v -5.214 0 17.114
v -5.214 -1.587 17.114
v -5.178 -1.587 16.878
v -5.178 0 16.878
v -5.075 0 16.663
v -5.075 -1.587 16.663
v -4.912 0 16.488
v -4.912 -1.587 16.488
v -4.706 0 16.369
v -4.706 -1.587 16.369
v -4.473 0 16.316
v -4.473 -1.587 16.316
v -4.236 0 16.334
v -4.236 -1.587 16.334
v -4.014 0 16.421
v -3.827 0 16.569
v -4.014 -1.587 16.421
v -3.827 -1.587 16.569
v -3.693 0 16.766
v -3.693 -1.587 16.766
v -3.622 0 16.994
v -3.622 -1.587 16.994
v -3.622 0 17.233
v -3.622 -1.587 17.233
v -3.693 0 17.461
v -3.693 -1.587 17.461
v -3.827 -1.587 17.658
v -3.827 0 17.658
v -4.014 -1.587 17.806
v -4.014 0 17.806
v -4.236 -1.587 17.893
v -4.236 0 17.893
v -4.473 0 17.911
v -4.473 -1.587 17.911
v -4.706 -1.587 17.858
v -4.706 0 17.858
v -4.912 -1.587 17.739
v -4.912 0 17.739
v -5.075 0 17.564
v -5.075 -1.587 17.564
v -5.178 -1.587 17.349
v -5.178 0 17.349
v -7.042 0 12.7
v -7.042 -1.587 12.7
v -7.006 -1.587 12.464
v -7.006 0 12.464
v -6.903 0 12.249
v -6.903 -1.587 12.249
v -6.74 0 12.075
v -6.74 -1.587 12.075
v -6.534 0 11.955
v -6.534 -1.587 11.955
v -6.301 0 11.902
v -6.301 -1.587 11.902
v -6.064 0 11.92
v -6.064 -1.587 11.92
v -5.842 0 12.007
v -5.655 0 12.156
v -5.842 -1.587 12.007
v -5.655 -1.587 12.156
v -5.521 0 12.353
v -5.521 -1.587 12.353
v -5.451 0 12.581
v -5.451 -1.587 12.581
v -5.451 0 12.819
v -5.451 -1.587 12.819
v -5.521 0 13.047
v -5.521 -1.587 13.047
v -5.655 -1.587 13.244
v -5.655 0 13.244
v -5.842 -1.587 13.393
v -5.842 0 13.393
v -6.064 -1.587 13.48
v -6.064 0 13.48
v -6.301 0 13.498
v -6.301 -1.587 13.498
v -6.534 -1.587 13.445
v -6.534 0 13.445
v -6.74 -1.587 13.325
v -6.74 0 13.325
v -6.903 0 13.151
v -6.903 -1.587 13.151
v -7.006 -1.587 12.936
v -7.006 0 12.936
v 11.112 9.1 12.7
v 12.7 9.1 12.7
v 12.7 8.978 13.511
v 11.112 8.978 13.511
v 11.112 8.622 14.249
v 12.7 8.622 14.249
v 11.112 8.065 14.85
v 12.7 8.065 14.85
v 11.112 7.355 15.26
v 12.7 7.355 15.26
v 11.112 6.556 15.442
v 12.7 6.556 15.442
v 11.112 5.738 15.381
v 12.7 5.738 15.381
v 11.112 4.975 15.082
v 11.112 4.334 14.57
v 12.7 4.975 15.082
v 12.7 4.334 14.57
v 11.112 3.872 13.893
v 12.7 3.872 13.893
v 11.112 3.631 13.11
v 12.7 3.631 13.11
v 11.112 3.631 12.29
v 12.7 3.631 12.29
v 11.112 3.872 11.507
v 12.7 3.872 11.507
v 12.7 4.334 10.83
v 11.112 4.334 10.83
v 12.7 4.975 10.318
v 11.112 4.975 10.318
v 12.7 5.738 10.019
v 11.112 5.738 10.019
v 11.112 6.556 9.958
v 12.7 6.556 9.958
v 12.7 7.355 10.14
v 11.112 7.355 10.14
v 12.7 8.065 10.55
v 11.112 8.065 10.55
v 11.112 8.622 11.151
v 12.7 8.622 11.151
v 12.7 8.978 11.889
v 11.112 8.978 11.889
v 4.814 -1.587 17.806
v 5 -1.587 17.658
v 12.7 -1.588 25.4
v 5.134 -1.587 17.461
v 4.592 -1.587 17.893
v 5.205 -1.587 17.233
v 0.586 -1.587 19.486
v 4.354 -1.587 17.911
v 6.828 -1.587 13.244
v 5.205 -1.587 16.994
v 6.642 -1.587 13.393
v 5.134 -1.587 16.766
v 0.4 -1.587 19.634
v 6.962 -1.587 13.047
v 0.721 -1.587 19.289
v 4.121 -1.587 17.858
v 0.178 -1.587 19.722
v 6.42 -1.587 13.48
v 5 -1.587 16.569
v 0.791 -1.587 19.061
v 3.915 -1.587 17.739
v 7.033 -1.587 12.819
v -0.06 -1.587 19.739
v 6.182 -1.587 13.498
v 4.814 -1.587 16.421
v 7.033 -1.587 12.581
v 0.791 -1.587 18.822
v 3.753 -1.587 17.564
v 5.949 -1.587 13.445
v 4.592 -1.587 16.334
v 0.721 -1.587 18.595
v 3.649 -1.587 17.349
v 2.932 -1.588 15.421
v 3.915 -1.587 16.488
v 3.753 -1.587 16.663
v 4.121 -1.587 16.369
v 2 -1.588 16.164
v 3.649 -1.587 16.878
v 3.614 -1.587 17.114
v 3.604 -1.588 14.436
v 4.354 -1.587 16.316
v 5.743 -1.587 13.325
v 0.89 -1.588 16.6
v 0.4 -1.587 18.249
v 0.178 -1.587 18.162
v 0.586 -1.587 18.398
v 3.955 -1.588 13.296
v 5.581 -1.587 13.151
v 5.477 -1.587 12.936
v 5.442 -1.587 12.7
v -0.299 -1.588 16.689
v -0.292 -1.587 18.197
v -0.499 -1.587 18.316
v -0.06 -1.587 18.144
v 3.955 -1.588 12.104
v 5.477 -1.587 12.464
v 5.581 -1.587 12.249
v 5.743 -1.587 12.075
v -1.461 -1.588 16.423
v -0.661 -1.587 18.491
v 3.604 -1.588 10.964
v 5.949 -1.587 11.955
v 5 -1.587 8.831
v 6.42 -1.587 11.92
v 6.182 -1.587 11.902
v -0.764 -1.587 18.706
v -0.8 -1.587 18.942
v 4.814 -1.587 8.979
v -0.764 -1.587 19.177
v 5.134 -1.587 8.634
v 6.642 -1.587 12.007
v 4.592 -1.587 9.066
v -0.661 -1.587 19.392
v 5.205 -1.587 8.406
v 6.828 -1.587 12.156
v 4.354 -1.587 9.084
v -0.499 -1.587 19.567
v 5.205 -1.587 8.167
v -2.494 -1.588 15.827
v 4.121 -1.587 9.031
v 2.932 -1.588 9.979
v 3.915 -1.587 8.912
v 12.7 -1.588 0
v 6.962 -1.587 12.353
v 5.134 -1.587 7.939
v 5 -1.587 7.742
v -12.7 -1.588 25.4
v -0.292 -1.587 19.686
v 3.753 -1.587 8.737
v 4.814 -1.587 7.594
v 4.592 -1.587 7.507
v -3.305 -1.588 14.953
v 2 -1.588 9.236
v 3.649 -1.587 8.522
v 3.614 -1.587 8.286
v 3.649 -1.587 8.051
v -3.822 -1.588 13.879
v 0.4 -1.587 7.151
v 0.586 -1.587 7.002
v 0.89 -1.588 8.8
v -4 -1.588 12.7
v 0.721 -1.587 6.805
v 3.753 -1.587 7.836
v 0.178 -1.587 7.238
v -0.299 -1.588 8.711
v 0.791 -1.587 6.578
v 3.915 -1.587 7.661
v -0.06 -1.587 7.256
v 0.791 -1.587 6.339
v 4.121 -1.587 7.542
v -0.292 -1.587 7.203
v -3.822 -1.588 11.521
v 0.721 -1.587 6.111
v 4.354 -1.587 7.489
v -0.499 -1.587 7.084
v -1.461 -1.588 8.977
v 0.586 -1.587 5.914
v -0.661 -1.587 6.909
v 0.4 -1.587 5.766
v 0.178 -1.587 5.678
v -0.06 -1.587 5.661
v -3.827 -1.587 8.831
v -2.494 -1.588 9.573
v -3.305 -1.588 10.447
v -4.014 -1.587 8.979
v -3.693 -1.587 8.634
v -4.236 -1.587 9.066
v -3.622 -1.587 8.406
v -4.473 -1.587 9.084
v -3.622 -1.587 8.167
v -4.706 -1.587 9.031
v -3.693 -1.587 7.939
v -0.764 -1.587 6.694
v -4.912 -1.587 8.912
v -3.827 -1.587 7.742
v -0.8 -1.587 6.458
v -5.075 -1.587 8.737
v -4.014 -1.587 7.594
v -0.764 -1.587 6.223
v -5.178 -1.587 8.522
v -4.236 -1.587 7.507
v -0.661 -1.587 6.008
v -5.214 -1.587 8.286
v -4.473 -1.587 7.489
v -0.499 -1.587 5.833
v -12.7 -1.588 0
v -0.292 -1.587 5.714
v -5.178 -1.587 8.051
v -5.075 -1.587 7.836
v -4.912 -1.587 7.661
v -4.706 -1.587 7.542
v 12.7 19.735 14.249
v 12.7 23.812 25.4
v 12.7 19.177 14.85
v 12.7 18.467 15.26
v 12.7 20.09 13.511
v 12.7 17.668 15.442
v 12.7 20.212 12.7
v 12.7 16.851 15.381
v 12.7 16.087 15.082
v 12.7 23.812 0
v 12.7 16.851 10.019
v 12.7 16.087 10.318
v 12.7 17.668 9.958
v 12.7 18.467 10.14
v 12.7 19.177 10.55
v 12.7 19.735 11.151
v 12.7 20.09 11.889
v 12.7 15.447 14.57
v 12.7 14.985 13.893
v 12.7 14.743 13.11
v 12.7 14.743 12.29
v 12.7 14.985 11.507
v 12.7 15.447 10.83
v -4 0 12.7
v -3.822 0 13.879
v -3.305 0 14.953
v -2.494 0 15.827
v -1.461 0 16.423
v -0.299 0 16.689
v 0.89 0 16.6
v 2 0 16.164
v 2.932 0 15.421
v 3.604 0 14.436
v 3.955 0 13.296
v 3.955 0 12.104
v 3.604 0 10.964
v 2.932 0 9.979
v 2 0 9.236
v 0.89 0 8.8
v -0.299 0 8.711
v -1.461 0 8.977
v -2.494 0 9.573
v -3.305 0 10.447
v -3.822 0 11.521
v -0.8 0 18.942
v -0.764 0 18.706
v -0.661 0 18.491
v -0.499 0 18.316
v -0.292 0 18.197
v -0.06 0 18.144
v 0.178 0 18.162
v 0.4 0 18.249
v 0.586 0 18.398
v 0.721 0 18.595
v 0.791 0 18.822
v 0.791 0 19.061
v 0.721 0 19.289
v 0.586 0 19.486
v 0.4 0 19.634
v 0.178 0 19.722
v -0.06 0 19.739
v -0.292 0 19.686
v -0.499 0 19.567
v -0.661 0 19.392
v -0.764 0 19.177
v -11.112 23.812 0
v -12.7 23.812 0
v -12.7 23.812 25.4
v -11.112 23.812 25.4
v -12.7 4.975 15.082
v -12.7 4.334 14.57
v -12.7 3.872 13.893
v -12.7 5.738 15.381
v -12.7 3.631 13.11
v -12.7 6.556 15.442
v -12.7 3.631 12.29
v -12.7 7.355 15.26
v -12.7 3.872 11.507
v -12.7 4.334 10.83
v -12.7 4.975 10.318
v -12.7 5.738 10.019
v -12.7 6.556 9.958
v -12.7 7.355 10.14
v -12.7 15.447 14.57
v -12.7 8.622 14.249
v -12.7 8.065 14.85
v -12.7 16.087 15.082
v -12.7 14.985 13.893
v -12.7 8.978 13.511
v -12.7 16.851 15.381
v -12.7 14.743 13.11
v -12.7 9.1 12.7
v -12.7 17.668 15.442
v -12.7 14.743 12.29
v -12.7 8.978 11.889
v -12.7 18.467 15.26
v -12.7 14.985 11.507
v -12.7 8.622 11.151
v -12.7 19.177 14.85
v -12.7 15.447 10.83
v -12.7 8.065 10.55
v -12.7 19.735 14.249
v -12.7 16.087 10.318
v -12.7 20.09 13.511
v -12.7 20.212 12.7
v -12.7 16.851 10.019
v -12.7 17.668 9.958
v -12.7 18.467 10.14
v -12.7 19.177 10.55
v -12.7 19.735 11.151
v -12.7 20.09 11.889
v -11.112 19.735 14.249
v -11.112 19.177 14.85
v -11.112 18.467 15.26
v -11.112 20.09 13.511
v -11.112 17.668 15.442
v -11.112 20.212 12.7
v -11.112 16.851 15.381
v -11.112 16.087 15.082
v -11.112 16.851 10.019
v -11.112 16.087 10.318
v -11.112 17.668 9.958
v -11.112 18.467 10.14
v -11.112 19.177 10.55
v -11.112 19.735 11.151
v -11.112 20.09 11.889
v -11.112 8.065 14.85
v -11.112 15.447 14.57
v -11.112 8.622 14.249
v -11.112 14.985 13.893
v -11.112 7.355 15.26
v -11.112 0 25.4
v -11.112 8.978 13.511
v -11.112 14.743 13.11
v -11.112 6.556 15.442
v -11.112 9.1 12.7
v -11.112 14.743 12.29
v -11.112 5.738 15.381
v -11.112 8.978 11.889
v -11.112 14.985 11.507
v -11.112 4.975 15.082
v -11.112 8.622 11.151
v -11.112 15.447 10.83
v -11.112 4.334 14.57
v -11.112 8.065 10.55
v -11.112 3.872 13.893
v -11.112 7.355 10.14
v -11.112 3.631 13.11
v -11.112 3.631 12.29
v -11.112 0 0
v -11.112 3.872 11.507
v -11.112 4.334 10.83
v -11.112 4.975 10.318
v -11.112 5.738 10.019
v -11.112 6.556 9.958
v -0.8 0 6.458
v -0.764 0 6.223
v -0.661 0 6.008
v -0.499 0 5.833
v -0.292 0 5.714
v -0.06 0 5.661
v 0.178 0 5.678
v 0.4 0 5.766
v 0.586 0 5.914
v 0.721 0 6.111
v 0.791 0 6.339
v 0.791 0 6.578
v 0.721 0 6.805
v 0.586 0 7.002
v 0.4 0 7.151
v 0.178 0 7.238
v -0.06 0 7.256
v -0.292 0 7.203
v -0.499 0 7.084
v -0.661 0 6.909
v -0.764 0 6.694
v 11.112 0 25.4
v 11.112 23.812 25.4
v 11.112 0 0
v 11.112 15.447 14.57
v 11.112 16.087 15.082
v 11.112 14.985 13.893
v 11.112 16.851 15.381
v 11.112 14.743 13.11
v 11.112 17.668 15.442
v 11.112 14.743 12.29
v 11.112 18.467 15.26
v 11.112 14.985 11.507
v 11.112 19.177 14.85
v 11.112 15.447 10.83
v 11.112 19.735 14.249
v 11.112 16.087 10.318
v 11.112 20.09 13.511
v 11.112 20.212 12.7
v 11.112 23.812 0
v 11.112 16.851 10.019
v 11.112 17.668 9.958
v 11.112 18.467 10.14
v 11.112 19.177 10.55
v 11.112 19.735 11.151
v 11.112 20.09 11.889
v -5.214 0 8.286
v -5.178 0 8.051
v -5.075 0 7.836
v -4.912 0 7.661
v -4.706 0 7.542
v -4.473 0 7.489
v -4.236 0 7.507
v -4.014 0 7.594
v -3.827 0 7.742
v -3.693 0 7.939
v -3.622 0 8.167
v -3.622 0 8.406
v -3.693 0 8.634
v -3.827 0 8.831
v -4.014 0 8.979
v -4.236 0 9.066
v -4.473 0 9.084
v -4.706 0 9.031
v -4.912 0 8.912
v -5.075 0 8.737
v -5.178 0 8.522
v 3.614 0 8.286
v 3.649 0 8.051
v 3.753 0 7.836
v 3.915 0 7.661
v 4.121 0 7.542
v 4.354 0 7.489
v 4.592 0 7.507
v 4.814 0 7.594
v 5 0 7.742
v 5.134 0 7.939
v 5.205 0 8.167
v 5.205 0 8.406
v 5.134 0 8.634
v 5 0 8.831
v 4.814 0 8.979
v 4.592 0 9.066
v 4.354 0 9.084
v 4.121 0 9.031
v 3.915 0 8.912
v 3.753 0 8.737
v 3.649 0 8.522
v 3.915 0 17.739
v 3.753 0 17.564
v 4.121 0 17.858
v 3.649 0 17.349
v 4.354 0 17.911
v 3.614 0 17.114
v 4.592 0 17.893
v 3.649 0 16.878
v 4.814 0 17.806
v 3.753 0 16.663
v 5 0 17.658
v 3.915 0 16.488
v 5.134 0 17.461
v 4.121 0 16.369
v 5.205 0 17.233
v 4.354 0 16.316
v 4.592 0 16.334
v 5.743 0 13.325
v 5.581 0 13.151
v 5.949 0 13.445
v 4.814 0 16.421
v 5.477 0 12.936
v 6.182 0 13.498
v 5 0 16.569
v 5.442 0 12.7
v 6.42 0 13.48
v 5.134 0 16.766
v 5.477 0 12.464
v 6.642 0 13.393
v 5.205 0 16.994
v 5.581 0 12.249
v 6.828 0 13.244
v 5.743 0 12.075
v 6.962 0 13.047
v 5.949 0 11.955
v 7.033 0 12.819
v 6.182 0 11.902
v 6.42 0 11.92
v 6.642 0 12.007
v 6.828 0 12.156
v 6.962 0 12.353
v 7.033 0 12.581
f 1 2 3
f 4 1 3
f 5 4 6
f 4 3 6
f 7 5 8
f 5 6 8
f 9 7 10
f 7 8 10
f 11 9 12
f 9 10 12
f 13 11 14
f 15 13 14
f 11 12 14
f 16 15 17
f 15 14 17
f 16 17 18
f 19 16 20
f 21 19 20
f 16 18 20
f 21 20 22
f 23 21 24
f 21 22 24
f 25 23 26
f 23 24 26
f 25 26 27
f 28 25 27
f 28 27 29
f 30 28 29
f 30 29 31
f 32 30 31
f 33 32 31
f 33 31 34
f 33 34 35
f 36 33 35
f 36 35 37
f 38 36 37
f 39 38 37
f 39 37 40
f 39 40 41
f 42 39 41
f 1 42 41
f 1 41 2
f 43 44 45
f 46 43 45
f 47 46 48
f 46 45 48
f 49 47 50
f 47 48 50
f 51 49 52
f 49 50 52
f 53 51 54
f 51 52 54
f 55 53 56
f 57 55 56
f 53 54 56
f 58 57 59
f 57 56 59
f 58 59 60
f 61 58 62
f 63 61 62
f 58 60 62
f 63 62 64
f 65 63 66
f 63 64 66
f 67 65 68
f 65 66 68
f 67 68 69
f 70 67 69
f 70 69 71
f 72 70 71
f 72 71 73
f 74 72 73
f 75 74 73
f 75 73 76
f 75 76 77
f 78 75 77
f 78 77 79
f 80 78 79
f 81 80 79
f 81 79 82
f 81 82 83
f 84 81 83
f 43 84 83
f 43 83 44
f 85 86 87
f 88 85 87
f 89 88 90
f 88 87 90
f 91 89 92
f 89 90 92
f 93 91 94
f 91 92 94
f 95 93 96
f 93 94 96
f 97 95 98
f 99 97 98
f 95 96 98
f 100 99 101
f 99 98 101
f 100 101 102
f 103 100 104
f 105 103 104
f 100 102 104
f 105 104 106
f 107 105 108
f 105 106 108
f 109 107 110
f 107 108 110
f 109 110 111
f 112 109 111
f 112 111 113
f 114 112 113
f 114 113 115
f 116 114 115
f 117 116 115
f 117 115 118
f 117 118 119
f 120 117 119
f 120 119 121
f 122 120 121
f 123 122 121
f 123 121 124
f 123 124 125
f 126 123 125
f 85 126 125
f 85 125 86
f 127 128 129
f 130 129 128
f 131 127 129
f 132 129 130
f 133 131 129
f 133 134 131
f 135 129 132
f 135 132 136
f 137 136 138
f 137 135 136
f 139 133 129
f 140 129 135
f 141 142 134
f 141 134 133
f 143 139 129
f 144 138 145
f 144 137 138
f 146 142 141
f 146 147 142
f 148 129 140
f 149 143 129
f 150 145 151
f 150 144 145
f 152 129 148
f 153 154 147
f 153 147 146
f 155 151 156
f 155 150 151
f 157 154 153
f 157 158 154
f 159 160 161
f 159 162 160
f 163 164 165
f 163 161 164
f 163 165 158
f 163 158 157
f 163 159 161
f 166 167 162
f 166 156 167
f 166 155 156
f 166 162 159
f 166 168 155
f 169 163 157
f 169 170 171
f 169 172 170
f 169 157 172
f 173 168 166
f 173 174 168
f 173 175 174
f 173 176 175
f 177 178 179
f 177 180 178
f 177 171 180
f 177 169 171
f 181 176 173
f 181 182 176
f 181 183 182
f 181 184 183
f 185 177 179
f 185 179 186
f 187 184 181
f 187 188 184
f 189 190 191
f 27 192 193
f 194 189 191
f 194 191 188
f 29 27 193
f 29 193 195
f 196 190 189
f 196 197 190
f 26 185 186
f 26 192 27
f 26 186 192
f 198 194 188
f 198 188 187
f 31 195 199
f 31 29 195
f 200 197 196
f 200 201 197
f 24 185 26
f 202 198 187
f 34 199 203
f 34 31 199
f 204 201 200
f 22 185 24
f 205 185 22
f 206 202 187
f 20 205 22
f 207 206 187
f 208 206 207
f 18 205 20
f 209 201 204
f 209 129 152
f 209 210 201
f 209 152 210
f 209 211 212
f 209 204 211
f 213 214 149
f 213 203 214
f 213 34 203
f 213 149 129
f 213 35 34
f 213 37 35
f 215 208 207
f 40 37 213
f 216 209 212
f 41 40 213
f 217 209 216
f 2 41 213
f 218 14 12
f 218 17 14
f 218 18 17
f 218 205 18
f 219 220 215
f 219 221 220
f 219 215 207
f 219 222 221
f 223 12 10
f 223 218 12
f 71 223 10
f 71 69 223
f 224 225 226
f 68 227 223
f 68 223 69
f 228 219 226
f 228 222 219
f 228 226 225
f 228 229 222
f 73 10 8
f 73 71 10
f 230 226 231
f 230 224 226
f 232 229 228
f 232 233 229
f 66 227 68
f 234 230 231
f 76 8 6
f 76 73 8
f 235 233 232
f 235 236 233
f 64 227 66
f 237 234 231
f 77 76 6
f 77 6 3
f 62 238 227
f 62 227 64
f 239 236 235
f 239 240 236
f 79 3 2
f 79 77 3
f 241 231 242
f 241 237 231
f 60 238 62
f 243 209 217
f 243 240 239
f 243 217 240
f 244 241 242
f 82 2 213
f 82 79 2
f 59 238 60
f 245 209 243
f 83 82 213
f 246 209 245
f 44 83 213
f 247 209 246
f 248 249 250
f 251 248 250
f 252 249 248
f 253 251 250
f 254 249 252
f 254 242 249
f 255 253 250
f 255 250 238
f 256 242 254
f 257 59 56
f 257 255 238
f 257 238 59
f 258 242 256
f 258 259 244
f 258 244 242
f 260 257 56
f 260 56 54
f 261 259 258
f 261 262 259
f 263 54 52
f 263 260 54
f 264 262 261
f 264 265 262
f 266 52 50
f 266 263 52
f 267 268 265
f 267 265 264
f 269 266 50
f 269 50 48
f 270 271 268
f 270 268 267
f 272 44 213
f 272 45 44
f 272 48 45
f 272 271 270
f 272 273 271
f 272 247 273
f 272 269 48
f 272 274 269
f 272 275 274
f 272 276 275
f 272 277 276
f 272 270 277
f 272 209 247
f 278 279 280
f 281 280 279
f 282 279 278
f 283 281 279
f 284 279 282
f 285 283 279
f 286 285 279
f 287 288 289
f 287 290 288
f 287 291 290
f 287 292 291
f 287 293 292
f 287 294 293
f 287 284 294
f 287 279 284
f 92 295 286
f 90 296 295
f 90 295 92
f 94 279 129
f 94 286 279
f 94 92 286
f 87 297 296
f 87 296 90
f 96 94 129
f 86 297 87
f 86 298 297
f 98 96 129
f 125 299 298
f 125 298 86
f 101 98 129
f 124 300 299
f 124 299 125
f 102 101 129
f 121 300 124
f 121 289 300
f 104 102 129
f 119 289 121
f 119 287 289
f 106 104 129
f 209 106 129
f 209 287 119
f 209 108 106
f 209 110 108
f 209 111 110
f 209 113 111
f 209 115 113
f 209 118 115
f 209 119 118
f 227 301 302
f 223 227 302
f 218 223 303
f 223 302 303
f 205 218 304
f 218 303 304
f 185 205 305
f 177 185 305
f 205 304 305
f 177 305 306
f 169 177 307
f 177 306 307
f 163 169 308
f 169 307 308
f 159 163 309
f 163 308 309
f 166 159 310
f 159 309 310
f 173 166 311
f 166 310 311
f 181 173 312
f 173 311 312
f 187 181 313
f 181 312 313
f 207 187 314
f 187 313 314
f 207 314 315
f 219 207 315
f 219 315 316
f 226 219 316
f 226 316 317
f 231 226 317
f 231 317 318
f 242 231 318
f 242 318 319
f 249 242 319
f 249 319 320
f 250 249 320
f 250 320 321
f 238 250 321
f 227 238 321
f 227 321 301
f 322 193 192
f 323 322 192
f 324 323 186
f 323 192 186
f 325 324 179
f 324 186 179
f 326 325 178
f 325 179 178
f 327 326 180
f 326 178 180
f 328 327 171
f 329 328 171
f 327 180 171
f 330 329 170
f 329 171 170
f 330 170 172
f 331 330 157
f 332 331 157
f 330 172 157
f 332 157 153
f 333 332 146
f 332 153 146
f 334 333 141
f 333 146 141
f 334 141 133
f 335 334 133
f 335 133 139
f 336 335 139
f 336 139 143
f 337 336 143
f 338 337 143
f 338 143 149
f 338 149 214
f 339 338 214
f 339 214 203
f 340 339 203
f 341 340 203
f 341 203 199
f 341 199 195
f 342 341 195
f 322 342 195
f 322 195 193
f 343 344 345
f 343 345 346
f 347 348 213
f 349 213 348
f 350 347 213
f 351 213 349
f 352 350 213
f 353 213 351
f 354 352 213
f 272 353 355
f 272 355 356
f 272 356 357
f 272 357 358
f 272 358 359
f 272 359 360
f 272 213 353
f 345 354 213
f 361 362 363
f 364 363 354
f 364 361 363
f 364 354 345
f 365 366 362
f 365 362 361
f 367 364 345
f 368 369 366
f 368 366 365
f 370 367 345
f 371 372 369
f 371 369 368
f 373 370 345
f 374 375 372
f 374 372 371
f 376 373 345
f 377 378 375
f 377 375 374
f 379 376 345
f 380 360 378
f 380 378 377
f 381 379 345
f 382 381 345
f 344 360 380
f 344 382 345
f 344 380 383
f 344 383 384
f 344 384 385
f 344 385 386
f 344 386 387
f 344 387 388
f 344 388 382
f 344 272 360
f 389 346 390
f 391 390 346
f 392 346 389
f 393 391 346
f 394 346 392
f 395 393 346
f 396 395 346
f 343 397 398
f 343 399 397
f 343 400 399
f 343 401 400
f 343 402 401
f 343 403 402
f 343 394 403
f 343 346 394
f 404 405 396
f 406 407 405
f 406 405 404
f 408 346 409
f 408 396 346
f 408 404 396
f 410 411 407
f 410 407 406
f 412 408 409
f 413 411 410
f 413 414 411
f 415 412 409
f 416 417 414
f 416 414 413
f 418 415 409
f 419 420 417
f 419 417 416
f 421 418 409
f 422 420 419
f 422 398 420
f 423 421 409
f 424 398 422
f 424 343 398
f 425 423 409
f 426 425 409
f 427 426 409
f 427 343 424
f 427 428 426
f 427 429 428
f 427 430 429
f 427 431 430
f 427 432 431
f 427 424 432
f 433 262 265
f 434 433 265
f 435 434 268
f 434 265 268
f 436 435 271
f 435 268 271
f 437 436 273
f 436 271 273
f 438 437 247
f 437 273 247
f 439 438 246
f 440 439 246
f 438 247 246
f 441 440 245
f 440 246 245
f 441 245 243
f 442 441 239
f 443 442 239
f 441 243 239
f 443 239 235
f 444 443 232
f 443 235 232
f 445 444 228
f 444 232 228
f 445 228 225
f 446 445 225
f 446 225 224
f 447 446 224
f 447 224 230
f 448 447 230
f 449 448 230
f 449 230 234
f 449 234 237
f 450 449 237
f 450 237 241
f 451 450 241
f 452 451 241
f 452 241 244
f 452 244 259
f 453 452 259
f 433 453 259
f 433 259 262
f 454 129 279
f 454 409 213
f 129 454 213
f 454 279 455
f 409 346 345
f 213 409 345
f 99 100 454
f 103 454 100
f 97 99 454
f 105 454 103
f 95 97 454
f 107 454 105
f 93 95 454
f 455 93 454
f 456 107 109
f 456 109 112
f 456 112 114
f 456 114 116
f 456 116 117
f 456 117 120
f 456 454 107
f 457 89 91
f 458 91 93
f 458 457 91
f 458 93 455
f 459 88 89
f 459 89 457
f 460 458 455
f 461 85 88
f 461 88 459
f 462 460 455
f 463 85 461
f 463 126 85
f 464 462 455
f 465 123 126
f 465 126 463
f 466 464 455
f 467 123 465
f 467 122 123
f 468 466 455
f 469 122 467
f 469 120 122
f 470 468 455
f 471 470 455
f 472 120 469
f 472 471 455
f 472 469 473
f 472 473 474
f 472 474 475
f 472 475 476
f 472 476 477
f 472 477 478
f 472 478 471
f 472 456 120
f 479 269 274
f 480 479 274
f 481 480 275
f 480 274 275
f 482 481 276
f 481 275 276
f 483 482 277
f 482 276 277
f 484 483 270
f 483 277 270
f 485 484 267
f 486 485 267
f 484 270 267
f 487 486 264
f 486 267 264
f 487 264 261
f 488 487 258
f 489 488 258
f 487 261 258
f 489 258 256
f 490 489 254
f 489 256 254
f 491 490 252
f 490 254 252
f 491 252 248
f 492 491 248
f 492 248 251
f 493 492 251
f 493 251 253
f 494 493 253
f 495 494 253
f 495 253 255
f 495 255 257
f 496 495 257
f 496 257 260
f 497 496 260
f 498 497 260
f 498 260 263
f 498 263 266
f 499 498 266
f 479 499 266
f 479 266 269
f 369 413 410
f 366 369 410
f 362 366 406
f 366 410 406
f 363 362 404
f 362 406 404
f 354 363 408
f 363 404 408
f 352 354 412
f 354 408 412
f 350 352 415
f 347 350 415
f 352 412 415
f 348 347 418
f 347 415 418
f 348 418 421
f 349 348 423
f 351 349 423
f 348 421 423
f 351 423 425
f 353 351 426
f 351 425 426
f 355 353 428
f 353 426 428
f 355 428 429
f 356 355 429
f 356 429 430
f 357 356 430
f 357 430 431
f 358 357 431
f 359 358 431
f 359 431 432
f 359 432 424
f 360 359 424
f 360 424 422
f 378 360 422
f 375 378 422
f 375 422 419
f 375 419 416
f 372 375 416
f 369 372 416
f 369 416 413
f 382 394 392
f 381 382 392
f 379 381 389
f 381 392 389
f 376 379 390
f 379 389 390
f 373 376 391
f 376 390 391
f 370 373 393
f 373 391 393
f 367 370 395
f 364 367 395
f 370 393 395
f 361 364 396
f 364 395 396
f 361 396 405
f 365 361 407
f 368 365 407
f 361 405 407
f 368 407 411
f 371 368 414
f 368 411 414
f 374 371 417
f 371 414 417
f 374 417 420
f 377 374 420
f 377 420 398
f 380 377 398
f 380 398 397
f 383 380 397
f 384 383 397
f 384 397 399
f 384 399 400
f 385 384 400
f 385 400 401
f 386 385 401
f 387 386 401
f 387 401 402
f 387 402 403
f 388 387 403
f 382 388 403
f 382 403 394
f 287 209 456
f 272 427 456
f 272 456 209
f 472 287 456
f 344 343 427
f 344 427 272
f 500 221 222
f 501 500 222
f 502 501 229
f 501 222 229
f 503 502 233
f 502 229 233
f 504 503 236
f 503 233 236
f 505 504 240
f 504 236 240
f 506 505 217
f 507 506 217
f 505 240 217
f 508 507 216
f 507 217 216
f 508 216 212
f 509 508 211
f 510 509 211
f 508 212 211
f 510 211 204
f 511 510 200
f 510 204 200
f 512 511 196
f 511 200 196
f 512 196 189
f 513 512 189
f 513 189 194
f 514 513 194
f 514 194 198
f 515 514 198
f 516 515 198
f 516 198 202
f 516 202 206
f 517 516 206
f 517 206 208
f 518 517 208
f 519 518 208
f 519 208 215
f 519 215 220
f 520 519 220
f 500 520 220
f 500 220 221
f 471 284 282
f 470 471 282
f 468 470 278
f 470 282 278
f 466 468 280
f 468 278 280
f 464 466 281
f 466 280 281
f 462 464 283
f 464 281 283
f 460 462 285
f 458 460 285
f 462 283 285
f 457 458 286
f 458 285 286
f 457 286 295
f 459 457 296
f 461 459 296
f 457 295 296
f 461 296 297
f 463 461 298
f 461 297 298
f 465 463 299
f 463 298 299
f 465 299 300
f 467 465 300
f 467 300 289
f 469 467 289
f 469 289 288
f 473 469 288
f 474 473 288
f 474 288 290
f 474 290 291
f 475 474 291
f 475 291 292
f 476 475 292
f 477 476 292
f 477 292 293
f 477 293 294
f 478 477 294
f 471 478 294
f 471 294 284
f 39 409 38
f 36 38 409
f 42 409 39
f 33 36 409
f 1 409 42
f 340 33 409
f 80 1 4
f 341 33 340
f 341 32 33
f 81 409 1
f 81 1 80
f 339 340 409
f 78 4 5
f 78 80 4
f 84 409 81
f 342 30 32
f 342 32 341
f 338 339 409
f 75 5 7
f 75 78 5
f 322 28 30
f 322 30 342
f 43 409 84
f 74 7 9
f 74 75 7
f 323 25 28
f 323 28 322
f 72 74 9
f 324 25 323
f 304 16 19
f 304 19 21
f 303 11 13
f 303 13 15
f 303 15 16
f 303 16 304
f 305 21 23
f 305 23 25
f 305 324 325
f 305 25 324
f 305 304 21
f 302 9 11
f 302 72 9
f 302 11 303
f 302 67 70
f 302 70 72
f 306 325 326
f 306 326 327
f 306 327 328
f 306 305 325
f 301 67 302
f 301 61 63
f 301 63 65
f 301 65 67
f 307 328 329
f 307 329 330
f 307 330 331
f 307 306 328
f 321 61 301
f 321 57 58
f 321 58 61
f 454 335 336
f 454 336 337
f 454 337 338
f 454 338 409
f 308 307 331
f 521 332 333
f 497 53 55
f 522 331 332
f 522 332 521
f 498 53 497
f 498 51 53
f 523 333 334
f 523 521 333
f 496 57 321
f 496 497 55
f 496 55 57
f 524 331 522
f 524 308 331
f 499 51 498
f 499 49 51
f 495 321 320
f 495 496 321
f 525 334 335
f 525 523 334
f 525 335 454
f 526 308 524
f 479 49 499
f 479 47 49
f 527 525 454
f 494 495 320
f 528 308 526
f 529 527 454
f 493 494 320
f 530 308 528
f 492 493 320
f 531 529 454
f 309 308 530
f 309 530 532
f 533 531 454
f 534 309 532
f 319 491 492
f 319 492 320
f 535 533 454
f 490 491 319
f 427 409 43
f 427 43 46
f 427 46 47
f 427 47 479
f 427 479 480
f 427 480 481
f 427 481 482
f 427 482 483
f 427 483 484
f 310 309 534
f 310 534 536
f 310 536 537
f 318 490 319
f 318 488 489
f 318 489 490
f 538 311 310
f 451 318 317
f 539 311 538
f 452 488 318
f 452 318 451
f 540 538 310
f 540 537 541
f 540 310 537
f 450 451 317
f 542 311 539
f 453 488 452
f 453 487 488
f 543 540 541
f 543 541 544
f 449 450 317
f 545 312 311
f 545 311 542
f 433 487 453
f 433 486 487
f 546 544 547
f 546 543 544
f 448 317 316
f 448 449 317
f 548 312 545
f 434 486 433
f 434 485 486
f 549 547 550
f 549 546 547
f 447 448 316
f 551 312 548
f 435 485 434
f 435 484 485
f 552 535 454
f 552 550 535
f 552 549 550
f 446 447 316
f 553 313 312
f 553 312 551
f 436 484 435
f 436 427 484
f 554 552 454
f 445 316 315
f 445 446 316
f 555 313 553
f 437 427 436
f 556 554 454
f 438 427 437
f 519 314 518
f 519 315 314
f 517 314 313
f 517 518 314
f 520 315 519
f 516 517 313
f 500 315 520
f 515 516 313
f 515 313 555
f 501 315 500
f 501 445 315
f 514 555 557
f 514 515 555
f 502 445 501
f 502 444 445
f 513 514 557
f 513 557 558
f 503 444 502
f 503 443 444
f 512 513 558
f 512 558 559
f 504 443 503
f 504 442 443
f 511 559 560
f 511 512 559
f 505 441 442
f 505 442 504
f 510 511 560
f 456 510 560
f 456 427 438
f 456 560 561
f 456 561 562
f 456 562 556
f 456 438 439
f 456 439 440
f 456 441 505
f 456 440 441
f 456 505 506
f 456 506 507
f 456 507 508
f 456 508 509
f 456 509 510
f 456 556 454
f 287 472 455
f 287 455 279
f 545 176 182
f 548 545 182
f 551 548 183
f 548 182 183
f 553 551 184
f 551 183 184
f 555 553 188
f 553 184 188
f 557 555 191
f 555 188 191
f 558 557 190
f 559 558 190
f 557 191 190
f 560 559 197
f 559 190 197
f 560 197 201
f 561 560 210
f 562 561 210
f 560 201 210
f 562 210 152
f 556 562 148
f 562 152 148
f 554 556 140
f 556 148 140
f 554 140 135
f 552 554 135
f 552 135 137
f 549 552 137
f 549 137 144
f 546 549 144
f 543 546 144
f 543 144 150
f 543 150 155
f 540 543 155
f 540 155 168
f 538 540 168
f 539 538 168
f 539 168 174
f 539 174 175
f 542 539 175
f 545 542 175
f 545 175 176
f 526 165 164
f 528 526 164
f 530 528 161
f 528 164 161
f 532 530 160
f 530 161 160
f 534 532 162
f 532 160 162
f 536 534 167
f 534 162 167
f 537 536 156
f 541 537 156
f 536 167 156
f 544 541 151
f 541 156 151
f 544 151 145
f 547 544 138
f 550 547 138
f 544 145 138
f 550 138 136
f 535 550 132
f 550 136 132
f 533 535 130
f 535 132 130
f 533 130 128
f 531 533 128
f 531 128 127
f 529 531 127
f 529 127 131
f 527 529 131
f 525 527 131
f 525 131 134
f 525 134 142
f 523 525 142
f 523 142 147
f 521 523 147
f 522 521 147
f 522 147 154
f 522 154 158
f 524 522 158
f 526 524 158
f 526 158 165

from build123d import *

# Parameters (mm, degrees)
BOSS_EXTRUDE1_DEPTH   = 25.4
SKETCH2_R             = 2.75
CUT_EXTRUDE1_DEPTH    = 44.097043475
SKETCH3_R             = 4
CUT_EXTRUDE2_DEPTH    = 38.060560658
M2X0_4_TAPPED_HOLE1_D = 1.6


with BuildPart() as part:
    # Sketch1 → Boss-Extrude1 (new body)
    with BuildSketch(Plane.XY):
        Polygon((-11.1125, 0), (11.1125, 0), (11.1125, 23.8125), (12.7, 23.8125), (12.7, -1.5875), (-12.7, -1.5875), (-12.7, 23.8125), (-11.1125, 23.8125), align=None)
    extrude(amount=BOSS_EXTRUDE1_DEPTH)

    # Sketch2 → Cut-Extrude1 (cut, through all)
    with BuildSketch(Plane(origin=(12.7, 0, 0), x_dir=(0, 0, -1), z_dir=(1, 0, 0))):
        with Locations(Location((-12.7, 17.4625, 0), (0, 0, 90))):
            Circle(SKETCH2_R)
        with Locations(Location((-12.7, 6.35, 0), (0, 0, 90))):
            Circle(SKETCH2_R)
    extrude(amount=-CUT_EXTRUDE1_DEPTH, mode=Mode.SUBTRACT)

    # Sketch3 → Cut-Extrude2 (cut, through all)
    with BuildSketch(Plane(origin=(0, 0, 0), x_dir=(1, 0, 0), z_dir=(0, 1, 0))):
        with Locations(Location((0, -12.7, 0), (0, 0, 180))):
            Circle(SKETCH3_R)
    extrude(amount=-CUT_EXTRUDE2_DEPTH, mode=Mode.SUBTRACT)

    # M2x0.4 Tapped Hole1 (through all)
    with Locations(Plane(origin=(0, 0, 0), x_dir=(1, 0, 0), z_dir=(0, 1, 0))):
        with Locations((0, -6.458326036), (4.413529986, -8.286470014), (6.241673964, -12.7), (4.413529986, -17.113529986), (0, -18.941673964), (-4.413529986, -17.113529986), (-6.241673964, -12.7), (-4.413529986, -8.286470014)):
            Hole(M2X0_4_TAPPED_HOLE1_D / 2)


solid = part.part
